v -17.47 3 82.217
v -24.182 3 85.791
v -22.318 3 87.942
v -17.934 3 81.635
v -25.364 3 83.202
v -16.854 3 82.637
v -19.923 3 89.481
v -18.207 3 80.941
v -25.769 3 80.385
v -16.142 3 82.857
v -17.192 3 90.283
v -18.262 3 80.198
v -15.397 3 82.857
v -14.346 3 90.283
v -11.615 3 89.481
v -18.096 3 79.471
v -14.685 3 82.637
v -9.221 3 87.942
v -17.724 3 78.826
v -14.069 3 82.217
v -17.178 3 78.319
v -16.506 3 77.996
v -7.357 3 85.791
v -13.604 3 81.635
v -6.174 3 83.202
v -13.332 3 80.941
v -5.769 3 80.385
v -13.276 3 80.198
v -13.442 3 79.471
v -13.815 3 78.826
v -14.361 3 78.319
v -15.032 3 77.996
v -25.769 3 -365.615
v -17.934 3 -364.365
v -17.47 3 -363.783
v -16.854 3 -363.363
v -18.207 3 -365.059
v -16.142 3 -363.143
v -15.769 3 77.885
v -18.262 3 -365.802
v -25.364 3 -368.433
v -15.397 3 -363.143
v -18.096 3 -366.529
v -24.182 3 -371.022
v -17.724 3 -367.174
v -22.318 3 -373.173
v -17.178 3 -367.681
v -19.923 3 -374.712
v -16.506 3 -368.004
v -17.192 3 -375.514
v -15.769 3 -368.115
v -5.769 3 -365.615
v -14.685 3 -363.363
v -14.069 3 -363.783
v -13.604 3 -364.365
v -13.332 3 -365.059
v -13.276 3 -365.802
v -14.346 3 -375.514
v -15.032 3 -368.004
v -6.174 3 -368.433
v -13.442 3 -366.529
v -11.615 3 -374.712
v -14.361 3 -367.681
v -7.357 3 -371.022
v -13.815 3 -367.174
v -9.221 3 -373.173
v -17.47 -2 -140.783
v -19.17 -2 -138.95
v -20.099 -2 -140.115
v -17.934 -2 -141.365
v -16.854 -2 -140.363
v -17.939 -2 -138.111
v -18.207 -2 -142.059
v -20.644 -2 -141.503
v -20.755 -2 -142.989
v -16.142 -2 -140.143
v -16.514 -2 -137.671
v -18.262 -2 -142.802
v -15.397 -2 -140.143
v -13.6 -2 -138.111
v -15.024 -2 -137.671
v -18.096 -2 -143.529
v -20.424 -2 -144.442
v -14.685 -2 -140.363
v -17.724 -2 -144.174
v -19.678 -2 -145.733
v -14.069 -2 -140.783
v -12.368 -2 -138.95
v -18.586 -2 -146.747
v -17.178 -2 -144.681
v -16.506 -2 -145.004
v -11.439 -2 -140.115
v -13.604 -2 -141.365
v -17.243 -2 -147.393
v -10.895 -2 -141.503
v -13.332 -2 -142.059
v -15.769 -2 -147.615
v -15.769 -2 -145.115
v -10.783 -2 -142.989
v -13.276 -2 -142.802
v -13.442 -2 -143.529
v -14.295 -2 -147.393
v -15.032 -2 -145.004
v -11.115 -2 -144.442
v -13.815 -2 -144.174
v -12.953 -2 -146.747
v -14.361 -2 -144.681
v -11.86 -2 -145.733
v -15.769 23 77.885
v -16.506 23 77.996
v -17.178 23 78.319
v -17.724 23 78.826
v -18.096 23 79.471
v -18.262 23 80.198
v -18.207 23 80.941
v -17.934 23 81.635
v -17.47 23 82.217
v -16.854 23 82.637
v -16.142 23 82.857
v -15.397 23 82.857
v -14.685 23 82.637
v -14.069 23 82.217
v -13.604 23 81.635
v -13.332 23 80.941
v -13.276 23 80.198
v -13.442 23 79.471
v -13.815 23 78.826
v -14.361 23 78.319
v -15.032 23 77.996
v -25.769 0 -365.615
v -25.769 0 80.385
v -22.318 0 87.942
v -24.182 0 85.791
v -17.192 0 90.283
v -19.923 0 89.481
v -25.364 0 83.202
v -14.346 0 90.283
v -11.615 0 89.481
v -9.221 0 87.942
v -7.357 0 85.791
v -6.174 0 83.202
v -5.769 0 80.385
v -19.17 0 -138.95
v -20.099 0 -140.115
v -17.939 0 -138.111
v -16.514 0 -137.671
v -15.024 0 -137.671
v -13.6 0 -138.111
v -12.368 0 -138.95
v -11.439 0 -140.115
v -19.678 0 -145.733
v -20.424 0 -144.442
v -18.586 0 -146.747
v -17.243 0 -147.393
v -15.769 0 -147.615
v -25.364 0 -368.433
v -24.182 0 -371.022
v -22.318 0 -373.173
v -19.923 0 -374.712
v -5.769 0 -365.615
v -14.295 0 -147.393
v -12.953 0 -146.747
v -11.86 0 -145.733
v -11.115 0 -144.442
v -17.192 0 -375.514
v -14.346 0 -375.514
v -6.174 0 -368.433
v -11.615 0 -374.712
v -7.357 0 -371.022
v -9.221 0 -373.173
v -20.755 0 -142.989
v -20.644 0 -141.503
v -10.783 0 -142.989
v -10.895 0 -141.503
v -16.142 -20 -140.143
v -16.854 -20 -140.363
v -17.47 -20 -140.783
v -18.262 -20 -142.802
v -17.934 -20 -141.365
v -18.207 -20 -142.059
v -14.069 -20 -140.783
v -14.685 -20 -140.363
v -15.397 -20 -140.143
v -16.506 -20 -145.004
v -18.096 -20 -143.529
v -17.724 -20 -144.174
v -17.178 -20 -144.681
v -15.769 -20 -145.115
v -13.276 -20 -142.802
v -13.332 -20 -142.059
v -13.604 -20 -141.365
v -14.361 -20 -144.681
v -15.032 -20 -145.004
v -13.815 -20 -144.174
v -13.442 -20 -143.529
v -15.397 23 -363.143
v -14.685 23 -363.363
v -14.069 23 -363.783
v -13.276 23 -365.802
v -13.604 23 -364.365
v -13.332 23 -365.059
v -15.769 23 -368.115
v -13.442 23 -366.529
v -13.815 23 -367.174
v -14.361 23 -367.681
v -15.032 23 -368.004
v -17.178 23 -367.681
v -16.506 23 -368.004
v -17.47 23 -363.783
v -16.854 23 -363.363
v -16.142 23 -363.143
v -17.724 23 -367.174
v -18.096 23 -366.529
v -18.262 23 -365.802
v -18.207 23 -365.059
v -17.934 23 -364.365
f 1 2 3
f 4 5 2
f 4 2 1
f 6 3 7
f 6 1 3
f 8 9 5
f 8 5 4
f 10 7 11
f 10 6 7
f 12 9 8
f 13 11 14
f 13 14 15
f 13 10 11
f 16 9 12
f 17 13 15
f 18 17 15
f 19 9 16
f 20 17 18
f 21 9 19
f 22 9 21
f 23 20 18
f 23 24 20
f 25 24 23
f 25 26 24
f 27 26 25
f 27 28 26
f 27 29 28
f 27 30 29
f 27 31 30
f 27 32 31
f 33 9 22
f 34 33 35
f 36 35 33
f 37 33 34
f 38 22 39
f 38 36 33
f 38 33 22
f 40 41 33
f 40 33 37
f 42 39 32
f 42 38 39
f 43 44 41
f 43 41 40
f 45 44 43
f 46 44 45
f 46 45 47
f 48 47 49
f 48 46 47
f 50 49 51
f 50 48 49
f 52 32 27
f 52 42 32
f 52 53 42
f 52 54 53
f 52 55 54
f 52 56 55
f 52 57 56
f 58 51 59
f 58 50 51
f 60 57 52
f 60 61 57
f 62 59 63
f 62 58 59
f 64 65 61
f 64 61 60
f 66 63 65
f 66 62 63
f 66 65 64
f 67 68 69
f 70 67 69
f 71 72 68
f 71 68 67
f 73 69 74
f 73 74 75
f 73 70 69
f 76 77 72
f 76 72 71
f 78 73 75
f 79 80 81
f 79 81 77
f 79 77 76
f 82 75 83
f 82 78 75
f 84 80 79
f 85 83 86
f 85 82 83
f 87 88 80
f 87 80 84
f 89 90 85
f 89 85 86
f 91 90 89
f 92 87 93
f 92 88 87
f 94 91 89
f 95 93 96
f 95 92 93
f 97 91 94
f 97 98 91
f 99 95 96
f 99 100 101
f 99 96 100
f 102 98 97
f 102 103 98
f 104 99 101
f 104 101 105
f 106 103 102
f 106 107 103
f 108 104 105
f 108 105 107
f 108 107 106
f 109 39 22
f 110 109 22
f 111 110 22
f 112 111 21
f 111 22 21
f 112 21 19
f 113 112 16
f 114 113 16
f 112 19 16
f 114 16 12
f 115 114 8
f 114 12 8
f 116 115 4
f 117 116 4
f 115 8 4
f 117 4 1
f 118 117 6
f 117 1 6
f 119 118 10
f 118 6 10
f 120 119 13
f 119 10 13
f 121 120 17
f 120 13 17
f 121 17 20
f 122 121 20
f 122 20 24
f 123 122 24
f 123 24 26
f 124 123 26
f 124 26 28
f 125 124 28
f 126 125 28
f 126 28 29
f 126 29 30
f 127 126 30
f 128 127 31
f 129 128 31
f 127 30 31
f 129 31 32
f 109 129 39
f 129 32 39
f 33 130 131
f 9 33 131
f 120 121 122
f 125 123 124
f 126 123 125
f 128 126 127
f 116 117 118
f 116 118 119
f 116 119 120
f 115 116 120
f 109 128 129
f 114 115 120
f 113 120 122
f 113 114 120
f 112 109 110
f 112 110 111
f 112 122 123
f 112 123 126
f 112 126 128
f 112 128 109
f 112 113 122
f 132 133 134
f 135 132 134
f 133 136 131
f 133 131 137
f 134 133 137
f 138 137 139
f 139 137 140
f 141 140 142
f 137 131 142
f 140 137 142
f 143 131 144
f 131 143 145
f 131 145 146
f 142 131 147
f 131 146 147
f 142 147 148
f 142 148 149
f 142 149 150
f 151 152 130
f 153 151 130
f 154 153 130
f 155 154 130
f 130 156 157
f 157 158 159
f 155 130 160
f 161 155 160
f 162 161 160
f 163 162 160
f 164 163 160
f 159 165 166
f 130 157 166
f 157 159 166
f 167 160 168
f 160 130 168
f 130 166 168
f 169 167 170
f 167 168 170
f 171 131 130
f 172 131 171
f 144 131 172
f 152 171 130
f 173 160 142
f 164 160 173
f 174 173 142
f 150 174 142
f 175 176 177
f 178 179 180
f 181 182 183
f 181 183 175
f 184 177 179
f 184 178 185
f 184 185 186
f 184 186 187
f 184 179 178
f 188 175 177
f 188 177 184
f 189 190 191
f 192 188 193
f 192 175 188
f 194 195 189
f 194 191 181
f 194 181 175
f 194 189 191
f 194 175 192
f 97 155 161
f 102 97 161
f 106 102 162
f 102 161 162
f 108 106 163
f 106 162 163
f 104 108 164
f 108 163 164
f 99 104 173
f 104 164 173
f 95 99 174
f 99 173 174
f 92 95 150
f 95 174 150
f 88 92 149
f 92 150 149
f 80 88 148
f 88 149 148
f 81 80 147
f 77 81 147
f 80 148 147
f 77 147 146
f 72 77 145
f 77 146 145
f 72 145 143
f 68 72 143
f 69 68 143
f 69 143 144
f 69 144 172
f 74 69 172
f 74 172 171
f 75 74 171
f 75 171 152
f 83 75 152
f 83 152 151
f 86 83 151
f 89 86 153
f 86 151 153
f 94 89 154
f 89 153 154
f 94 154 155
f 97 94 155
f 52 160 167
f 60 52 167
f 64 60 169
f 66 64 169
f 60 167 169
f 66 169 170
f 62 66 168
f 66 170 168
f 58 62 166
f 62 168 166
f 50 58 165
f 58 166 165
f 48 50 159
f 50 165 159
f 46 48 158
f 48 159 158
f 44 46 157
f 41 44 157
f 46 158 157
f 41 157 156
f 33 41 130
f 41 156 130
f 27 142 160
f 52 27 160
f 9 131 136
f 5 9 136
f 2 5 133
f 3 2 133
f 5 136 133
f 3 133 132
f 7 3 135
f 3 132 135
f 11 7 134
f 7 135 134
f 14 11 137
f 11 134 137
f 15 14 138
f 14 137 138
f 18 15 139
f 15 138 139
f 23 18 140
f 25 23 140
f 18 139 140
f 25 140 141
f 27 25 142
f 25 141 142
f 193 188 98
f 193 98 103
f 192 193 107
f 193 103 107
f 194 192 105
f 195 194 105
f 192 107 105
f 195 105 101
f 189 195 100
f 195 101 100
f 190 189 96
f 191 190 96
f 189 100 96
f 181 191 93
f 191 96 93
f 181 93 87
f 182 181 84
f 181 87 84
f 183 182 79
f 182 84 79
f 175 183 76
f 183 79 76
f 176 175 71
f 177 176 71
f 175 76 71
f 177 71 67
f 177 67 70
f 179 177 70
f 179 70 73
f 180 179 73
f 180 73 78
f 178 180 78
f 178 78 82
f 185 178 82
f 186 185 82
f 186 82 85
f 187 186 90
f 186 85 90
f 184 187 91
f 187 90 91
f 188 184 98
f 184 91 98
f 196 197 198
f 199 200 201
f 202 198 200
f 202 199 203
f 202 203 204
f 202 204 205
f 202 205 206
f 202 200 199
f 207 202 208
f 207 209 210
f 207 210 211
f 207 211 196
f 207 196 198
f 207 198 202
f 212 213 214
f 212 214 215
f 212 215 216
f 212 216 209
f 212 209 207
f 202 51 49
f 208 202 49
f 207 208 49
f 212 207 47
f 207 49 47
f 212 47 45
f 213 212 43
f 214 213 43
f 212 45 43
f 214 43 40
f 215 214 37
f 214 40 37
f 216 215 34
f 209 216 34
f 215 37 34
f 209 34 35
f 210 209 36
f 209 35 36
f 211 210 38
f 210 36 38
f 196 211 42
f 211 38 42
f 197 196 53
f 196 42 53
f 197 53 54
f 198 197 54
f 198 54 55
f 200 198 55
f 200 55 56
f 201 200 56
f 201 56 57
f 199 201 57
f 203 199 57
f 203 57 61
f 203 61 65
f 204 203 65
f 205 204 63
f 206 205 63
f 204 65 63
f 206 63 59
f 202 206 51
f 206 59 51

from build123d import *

# Parameters (mm, degrees)
BOSS_EXTRUDE1_DEPTH = 3
SKETCH2_R           = 2.5
BOSS_EXTRUDE2_DEPTH = 20
SKETCH3_R           = 5
BOSS_EXTRUDE3_DEPTH = 2
SKETCH4_R           = 2.5
BOSS_EXTRUDE4_DEPTH = 18


with BuildPart() as part:
    # Sketch1 → Boss-Extrude1 (new body)
    with BuildSketch(Plane(origin=(0, 0, 0), x_dir=(1, 0, 0), z_dir=(0, 1, 0))):
        with BuildLine():
            Line((-25.769230769, 365.615384615), (-25.769230769, -80.384615385))
            ThreePointArc((-25.769230769, -80.384615385), (-15.769230769, -90.384615385), (-5.769230769, -80.384615385))
            Line((-5.769230769, -80.384615385), (-5.769230769, 365.615384615))
            ThreePointArc((-5.769230769, 365.615384615), (-15.769230769, 375.615384615), (-25.769230769, 365.615384615))
        make_face()
    extrude(amount=BOSS_EXTRUDE1_DEPTH)

    # Sketch2 → Boss-Extrude2 (add)
    with BuildSketch(Plane(origin=(0, 3, 0), x_dir=(1, 0, 0), z_dir=(0, 1, 0))):
        with Locations(Location((-15.769230769, -80.384615385, 0), (0, 0, 90))):
            Circle(SKETCH2_R)
        with Locations(Location((-15.769230769, 365.615384615, 0), (0, 0, 90))):
            Circle(SKETCH2_R)
    extrude(amount=BOSS_EXTRUDE2_DEPTH)

    # Sketch3 → Boss-Extrude3 (add)
    with BuildSketch(Plane.XZ):
        with Locations(Location((-15.769230769, -142.615384615, 0), (0, 0, 270))):
            Circle(SKETCH3_R)
    extrude(amount=BOSS_EXTRUDE3_DEPTH)

    # Sketch4 → Boss-Extrude4 (add)
    with BuildSketch(Plane.XZ.offset(2)):
        with Locations(Location((-15.769230769, -142.615384615, 0), (0, 0, 270))):
            Circle(SKETCH4_R)
    extrude(amount=BOSS_EXTRUDE4_DEPTH)


solid = part.part
